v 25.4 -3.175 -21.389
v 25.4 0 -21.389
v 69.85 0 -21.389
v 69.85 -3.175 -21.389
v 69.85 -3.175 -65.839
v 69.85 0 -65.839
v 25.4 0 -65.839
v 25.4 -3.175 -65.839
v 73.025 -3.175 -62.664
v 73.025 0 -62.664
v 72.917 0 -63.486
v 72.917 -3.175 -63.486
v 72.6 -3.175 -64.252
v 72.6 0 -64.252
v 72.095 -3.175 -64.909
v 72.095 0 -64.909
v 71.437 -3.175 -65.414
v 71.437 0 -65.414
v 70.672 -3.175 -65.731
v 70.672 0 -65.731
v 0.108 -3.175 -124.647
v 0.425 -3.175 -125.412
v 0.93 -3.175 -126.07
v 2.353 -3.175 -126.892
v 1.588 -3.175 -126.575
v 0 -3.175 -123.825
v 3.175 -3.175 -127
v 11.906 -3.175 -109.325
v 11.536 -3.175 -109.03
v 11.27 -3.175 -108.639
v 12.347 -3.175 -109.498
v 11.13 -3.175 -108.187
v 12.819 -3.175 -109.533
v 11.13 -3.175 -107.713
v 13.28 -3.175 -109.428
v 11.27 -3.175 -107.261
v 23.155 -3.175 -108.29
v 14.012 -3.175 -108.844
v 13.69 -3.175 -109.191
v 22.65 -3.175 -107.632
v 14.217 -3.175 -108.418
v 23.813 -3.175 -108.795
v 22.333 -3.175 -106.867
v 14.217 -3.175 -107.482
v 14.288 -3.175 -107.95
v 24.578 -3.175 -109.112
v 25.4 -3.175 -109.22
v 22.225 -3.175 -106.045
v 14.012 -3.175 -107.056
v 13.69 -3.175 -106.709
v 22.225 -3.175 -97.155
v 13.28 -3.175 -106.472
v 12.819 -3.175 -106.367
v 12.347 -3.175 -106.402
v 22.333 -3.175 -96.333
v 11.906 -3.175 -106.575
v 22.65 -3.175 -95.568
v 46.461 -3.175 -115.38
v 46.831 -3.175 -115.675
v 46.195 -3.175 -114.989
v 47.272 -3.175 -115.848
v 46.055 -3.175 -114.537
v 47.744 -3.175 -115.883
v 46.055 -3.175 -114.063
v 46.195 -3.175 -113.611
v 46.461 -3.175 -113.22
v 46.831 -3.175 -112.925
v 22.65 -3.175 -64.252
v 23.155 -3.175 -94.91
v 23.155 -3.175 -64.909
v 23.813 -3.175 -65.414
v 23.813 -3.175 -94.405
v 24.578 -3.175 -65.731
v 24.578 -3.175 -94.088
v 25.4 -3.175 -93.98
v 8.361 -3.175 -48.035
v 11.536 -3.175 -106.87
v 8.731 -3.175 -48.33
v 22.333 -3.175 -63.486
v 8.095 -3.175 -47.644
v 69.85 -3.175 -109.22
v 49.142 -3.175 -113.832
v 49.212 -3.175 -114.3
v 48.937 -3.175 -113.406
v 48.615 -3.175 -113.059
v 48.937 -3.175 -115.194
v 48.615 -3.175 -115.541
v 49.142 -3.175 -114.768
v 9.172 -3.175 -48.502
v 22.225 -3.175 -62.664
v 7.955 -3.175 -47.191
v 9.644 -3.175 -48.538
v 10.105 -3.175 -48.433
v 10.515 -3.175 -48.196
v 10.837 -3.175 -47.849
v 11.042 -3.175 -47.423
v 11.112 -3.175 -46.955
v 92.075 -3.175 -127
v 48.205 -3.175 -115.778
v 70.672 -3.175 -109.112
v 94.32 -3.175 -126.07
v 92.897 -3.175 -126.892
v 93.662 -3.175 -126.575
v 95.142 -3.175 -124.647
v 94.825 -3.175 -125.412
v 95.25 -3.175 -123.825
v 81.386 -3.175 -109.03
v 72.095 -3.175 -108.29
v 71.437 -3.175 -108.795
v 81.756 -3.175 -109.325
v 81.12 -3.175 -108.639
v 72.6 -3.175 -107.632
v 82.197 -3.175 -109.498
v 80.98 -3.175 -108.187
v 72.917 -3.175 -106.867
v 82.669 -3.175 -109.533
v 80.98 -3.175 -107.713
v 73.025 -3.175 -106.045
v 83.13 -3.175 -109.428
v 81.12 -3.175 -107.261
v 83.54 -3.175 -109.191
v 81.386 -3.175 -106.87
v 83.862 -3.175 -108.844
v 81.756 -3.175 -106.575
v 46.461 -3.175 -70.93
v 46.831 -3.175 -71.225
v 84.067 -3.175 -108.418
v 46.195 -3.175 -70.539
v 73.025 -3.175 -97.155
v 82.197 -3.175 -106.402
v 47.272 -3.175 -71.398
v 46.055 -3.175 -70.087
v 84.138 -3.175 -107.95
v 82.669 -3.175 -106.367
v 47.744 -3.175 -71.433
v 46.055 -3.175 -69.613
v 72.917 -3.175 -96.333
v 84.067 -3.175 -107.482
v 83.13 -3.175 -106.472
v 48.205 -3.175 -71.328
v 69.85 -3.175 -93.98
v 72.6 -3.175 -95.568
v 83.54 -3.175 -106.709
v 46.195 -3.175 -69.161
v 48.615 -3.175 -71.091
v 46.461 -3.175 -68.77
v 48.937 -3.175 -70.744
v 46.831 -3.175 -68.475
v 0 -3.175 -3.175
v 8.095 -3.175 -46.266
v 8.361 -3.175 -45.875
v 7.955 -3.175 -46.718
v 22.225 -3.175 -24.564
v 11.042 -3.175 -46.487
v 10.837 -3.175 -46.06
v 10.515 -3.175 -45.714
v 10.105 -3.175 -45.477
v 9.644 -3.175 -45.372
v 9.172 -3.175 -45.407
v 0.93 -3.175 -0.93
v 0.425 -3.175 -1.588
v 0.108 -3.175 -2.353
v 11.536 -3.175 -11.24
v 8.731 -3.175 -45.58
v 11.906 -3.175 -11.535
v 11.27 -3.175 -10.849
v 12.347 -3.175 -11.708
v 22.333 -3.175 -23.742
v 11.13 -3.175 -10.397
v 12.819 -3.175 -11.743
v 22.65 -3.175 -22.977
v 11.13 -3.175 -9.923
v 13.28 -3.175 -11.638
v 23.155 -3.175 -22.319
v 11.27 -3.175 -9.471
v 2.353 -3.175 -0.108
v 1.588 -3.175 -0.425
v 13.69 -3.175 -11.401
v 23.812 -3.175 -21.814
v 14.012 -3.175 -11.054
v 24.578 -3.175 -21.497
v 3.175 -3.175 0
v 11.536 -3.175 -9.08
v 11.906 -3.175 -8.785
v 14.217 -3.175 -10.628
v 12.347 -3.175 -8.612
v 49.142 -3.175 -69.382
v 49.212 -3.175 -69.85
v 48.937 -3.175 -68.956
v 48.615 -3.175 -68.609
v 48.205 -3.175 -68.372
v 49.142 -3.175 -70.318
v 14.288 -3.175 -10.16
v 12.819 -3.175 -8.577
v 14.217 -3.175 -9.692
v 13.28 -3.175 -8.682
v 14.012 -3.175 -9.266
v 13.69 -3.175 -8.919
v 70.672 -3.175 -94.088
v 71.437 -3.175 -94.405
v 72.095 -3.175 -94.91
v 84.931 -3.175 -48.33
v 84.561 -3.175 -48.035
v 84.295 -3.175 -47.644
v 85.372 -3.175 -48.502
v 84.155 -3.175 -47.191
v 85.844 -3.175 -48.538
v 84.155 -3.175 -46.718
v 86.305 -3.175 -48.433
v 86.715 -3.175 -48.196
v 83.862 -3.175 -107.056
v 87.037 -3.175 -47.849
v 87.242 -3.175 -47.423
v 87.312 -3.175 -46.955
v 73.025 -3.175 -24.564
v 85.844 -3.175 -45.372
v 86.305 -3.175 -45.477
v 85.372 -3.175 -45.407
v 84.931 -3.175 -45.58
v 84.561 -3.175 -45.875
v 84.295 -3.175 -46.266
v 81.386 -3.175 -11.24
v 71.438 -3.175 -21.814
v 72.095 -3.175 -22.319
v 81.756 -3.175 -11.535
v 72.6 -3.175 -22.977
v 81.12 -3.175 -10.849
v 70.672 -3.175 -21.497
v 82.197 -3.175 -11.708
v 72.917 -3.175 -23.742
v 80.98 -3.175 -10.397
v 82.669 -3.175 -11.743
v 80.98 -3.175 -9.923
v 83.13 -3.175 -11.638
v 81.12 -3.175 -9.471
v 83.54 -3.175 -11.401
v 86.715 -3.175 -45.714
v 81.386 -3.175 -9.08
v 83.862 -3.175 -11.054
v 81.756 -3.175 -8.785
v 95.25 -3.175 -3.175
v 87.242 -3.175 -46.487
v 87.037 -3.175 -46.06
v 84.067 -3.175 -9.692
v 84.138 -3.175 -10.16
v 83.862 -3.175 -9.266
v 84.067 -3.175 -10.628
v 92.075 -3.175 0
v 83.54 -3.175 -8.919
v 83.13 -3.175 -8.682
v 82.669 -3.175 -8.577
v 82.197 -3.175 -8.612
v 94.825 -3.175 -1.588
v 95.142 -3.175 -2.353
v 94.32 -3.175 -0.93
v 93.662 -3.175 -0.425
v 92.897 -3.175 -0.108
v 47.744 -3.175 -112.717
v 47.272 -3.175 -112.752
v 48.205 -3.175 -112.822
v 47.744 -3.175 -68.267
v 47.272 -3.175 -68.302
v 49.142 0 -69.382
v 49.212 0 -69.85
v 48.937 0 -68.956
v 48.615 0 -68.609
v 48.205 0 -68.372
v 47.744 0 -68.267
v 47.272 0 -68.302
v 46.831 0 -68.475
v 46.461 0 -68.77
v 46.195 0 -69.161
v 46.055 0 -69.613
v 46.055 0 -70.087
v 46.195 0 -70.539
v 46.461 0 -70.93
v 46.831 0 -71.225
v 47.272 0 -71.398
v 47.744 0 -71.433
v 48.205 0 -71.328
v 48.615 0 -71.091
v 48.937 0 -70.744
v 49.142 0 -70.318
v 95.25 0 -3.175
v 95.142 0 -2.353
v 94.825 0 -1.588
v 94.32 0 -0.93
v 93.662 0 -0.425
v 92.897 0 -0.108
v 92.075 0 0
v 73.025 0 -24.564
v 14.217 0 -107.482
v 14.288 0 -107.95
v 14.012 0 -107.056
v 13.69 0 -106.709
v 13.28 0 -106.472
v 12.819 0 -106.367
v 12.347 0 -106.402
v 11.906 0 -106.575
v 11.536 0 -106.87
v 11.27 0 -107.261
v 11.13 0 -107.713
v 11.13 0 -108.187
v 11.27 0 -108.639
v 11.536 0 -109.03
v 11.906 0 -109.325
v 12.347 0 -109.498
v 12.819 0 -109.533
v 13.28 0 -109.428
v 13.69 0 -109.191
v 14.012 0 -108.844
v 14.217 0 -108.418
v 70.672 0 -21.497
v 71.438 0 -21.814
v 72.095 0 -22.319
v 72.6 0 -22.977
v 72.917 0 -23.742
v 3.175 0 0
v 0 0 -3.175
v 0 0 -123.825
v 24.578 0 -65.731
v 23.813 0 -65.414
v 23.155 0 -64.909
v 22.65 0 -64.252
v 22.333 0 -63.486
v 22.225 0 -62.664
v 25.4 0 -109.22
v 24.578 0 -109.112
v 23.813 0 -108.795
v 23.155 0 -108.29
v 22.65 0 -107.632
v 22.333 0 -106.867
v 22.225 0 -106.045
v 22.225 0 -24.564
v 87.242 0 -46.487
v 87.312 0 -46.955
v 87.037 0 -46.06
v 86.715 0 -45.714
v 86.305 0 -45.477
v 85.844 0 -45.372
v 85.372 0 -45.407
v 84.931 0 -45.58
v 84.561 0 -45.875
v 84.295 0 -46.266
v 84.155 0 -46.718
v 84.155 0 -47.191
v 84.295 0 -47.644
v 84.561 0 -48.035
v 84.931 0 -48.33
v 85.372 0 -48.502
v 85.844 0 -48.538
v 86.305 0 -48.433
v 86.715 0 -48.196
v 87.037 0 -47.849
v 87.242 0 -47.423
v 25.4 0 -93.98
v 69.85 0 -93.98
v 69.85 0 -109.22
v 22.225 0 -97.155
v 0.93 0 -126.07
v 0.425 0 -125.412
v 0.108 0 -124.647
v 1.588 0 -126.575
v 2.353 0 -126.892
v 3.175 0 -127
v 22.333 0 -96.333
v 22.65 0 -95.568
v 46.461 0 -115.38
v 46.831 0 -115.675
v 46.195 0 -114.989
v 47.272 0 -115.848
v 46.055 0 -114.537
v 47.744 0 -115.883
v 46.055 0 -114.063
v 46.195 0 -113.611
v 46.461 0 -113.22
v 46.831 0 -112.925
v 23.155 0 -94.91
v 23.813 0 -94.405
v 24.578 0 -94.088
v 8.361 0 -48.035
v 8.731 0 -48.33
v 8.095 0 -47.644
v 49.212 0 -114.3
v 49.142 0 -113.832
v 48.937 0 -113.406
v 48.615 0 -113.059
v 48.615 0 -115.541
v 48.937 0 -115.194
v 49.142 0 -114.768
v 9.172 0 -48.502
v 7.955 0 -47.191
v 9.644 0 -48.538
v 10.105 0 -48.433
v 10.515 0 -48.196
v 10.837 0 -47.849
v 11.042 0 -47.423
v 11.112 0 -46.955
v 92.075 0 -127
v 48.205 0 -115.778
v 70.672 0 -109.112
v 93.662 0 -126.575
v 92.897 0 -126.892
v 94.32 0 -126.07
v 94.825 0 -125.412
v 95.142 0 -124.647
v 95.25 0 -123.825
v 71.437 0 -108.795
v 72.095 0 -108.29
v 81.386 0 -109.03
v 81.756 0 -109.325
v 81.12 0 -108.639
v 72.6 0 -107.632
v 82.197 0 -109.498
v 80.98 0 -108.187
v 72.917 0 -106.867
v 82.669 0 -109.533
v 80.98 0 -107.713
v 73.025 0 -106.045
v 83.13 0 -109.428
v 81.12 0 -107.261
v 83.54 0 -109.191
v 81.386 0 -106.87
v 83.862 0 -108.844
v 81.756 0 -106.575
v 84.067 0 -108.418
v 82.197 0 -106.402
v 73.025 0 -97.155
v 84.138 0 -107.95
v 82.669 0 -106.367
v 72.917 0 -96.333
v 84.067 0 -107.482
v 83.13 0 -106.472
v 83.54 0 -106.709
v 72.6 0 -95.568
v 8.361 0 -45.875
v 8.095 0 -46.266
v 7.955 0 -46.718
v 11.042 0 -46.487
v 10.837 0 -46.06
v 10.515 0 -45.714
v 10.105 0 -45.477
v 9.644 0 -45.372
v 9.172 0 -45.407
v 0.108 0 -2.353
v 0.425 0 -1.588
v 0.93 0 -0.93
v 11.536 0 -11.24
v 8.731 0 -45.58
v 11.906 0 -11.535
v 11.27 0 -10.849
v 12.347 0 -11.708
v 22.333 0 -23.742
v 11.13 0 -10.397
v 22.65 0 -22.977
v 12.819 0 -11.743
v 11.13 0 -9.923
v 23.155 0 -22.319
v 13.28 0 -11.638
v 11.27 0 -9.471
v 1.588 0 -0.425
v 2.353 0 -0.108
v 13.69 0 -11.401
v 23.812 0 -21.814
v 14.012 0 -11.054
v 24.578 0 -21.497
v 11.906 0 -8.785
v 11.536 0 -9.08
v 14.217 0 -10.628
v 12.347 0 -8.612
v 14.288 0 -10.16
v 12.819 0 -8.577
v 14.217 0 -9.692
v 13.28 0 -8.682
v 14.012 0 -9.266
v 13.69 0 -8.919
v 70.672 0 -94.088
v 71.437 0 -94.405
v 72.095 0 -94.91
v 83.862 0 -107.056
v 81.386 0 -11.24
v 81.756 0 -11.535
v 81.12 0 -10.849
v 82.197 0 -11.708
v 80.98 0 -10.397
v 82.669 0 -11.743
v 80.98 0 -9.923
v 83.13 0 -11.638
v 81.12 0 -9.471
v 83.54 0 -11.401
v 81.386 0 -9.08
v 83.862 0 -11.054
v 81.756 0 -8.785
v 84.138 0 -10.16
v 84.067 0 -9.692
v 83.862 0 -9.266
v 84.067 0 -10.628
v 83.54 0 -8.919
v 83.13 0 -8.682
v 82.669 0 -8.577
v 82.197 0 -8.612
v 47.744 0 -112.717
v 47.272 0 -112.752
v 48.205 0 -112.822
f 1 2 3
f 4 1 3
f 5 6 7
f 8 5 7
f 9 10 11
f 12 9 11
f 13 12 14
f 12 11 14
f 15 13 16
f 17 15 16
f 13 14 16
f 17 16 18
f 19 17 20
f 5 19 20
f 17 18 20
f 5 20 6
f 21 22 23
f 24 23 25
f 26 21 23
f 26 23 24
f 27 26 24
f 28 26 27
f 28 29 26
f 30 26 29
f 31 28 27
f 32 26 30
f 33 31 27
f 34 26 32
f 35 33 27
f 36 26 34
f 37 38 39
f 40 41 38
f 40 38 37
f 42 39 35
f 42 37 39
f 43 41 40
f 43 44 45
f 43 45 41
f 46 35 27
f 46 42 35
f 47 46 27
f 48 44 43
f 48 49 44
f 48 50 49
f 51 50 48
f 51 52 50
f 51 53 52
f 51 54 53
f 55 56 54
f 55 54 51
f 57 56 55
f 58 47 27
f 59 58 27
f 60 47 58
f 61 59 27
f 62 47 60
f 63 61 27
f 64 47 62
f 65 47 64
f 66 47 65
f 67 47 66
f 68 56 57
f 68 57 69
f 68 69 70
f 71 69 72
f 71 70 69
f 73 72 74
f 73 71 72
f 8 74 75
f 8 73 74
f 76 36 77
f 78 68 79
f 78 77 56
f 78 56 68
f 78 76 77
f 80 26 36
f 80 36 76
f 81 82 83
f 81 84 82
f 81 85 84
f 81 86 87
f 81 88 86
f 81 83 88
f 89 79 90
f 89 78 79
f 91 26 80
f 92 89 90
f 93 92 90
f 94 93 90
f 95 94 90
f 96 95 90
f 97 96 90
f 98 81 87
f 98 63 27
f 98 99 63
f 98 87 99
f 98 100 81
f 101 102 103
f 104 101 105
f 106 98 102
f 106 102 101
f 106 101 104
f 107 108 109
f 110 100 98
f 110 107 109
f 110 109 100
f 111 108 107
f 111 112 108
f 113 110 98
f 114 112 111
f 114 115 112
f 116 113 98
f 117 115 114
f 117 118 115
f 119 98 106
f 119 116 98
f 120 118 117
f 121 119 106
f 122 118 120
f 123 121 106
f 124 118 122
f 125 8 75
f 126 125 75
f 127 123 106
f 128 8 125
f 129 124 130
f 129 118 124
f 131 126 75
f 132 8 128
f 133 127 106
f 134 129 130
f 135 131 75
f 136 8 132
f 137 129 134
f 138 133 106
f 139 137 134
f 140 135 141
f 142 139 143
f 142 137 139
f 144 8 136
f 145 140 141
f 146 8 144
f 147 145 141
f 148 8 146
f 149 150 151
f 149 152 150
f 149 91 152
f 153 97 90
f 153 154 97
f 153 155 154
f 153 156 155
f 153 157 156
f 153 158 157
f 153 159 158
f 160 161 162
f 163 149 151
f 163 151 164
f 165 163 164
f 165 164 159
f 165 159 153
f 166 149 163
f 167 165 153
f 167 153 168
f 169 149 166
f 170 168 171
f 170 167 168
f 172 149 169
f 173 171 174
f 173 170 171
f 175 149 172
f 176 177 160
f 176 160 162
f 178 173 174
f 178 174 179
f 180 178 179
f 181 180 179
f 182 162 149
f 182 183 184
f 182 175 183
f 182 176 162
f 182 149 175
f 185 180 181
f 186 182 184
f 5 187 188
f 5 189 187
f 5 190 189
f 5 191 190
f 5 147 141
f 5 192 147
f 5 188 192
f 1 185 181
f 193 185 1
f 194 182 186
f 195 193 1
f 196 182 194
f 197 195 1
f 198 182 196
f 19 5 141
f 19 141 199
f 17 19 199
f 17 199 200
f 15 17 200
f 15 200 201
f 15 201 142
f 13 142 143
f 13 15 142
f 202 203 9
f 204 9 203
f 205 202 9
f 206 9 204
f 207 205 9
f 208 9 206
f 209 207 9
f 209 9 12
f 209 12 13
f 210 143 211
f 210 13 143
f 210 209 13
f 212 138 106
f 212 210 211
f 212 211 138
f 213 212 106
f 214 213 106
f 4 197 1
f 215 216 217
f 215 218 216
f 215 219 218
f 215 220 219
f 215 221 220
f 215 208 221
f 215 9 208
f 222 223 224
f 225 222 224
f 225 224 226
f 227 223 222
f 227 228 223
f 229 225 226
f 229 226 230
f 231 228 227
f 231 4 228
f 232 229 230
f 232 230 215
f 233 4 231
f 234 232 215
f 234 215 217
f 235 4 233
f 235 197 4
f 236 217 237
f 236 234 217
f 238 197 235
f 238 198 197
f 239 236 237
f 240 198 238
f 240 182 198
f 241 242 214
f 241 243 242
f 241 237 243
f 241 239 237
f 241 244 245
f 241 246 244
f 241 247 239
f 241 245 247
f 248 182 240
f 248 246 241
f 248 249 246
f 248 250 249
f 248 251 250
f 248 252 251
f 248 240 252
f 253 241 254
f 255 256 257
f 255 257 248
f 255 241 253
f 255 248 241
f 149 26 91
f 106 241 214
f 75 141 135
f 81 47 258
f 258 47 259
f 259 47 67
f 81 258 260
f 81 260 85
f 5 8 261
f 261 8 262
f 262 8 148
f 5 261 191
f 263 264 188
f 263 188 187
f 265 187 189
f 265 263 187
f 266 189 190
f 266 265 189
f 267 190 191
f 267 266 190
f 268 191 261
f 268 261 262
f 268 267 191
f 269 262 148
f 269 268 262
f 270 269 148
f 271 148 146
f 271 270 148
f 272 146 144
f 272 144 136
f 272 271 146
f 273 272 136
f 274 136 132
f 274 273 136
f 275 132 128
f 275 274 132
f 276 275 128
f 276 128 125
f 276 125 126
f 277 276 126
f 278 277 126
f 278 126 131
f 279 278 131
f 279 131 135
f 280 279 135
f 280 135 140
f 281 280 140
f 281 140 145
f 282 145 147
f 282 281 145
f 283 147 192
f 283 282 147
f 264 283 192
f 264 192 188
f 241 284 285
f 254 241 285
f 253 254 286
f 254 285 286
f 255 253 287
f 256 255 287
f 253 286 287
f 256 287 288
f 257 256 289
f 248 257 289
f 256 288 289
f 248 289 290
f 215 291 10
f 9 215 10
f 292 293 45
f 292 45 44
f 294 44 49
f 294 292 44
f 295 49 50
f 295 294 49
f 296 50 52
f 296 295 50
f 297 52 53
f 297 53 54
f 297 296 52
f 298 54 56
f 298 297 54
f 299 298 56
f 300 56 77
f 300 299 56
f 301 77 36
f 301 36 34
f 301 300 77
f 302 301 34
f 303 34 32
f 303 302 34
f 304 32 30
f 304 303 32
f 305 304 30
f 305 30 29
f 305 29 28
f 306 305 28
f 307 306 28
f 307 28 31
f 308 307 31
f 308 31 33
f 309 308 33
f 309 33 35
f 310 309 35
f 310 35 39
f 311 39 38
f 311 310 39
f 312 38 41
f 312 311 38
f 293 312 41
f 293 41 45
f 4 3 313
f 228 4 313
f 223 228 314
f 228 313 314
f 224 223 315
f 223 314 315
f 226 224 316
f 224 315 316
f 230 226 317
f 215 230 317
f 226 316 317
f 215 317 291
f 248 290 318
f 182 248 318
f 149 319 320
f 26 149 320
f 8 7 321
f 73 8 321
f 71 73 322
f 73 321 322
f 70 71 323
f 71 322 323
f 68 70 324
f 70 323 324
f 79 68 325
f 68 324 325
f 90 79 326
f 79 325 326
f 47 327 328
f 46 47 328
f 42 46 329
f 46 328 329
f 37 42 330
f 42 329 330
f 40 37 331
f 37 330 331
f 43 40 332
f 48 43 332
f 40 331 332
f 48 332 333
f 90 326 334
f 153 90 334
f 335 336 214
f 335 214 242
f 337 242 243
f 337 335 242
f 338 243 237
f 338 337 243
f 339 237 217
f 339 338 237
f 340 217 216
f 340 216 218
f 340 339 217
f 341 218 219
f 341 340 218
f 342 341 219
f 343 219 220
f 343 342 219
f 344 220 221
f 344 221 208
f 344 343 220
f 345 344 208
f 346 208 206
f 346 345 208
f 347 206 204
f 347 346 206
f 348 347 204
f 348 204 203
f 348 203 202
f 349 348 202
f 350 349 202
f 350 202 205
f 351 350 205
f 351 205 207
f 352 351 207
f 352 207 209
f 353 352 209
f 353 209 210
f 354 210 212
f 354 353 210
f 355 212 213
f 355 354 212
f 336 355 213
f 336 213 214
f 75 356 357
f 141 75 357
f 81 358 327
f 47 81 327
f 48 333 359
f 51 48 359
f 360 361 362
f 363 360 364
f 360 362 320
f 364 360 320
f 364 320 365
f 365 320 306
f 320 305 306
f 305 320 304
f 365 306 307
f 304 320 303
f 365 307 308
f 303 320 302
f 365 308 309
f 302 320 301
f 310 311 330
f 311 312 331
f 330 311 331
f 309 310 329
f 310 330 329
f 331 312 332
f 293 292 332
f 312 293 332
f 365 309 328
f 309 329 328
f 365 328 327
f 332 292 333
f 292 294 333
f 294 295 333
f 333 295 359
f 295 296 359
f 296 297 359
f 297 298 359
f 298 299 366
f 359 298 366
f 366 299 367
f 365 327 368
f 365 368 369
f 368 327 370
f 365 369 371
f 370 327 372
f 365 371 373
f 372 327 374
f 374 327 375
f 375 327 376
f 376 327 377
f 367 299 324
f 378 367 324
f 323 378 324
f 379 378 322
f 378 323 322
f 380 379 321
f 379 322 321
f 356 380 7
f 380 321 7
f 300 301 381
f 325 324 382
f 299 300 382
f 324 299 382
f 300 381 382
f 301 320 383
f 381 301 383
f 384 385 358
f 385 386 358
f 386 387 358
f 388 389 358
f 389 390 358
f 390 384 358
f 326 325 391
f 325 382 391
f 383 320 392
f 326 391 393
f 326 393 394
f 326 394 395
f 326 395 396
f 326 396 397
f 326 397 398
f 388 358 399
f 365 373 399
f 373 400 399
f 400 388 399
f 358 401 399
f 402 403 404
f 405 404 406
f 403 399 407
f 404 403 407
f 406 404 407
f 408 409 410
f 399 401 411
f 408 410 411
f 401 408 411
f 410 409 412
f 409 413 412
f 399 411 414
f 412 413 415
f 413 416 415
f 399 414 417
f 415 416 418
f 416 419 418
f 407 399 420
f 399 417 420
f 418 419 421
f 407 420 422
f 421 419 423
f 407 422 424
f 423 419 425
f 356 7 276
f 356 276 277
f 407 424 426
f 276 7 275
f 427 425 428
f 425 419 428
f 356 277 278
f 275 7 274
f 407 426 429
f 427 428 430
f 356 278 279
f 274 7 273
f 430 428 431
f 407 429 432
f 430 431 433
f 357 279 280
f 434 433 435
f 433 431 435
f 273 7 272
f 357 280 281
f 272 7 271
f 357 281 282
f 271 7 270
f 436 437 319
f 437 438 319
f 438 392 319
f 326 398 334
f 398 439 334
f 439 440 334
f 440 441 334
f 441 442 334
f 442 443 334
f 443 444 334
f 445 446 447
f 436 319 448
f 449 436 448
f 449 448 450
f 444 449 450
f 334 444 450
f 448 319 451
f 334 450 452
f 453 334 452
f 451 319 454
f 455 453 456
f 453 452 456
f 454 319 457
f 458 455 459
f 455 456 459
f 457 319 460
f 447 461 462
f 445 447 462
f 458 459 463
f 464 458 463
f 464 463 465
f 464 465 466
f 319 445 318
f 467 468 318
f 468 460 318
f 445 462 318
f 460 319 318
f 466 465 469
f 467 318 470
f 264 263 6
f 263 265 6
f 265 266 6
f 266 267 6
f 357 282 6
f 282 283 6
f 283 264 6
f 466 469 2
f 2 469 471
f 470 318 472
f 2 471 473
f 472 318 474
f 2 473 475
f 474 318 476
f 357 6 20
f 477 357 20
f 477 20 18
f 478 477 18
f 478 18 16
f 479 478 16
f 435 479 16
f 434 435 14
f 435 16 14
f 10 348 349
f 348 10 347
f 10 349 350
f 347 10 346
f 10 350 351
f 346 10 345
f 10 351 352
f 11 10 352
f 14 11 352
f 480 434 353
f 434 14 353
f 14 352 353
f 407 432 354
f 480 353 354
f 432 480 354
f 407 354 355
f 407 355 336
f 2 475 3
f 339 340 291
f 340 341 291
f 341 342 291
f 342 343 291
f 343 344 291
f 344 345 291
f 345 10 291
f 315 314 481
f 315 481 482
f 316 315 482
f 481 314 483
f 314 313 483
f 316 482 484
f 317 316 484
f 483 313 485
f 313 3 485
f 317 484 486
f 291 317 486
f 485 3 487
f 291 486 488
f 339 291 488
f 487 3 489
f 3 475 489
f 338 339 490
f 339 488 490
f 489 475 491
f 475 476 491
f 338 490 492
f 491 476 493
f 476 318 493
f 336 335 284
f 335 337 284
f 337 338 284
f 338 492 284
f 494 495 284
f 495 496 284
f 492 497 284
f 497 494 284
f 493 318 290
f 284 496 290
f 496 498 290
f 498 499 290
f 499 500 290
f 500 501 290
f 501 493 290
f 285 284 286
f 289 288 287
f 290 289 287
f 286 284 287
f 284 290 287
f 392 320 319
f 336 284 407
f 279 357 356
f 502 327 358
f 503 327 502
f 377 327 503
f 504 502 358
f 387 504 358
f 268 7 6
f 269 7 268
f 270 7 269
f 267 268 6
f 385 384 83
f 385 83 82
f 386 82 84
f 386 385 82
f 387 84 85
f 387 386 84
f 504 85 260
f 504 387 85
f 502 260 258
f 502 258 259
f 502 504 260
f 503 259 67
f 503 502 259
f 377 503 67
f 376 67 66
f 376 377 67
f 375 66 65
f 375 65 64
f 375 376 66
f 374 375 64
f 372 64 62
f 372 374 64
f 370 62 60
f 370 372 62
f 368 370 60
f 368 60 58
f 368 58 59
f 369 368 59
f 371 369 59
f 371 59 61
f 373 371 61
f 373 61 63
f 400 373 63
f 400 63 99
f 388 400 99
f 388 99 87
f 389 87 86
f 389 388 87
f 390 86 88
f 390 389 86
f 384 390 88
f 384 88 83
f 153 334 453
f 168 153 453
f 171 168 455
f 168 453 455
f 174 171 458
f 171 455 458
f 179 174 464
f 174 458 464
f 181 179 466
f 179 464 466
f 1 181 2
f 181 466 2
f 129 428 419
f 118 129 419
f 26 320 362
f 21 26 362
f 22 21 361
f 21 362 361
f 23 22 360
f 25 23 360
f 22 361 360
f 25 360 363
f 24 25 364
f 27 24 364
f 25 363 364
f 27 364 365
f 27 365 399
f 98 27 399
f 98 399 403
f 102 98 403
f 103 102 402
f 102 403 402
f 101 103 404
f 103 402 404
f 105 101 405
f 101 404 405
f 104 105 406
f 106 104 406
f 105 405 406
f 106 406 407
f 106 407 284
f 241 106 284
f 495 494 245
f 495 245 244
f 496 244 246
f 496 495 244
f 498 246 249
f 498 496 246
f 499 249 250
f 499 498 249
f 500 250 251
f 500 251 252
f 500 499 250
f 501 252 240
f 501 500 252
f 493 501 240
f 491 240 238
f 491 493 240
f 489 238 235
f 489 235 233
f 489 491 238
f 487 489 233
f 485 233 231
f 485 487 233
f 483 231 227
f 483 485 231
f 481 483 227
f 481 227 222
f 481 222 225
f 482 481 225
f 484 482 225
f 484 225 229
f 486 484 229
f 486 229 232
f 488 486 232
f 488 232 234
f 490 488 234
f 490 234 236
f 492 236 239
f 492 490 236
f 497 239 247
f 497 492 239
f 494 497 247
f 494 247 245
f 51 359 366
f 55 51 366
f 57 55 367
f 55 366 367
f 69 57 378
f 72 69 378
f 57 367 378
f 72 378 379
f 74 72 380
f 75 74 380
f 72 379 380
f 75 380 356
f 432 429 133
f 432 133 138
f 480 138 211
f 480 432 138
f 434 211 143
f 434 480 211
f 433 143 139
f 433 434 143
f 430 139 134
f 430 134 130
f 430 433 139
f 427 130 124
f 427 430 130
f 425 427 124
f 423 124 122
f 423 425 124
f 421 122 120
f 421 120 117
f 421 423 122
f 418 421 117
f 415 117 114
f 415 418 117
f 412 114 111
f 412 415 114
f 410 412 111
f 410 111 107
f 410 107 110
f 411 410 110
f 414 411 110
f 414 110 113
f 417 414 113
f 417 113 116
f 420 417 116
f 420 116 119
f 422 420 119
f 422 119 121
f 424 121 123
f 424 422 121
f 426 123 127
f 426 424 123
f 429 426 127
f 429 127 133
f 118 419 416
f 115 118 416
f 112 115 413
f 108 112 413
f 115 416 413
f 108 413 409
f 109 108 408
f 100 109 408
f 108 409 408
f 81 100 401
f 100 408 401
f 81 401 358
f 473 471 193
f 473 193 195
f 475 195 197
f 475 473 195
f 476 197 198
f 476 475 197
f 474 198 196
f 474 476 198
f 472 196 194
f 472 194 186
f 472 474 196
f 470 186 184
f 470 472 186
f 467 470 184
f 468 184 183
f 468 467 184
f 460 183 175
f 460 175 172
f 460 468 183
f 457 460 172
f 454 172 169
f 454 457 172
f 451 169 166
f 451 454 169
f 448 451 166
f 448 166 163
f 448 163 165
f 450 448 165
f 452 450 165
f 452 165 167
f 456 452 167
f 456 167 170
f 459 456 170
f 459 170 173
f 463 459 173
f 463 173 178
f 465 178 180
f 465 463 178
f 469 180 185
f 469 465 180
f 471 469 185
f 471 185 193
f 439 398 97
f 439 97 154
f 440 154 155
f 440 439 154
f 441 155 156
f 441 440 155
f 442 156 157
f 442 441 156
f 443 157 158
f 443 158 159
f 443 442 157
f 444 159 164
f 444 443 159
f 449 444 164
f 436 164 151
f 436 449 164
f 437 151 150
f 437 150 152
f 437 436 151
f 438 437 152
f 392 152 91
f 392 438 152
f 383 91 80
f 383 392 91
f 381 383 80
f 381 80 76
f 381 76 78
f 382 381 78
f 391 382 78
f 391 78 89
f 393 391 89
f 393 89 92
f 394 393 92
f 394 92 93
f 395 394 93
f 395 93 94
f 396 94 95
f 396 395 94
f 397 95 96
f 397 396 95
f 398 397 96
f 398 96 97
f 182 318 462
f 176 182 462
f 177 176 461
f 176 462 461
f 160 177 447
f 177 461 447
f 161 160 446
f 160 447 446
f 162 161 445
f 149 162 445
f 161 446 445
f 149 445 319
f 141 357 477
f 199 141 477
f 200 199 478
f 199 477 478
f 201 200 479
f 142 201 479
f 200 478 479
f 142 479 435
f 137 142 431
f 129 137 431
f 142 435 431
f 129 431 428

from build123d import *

# Parameters (mm, degrees)
F0_R     = 1.5875
F1_DEPTH = 3.175


with BuildPart() as f1:
    # F0 (on Front) → F1 (new body)
    with BuildSketch(Plane.XZ):
        with BuildLine():
            Line((92.075, 0), (3.175, 0))
            ThreePointArc((3.175, 0), (0.929936, -0.929936), (0, -3.175))
            Line((0, -3.175), (0, -123.825))
            ThreePointArc((0, -123.825), (0.929936, -126.070064), (3.175, -127))
            Line((3.175, -127), (92.075, -127))
            ThreePointArc((92.075, -127), (94.320064, -126.070064), (95.25, -123.825))
            Line((95.25, -123.825), (95.25, -3.175))
            ThreePointArc((95.25, -3.175), (94.320064, -0.929936), (92.075, 0))
        make_face()
        with Locations((12.7, -107.95)):
            Circle(F0_R, mode=Mode.SUBTRACT)
        with Locations((47.625, -114.3)):
            Circle(F0_R, mode=Mode.SUBTRACT)
        with BuildLine():
            Line((25.4, -93.98), (69.85, -93.98))
            ThreePointArc((69.85, -93.98), (72.095064, -94.909936), (73.025, -97.155))
            Line((73.025, -97.155), (73.025, -106.045))
            ThreePointArc((73.025, -106.045), (72.095064, -108.290064), (69.85, -109.22))
            Line((69.85, -109.22), (25.4, -109.22))
            ThreePointArc((25.4, -109.22), (23.154936, -108.290064), (22.225, -106.045))
            Line((22.225, -106.045), (22.225, -97.155))
            ThreePointArc((22.225, -97.155), (23.154936, -94.909936), (25.4, -93.98))
        make_face(mode=Mode.SUBTRACT)
        with Locations((82.55, -107.95)):
            Circle(F0_R, mode=Mode.SUBTRACT)
        with Locations((47.625, -69.85)):
            Circle(F0_R, mode=Mode.SUBTRACT)
        with Locations((9.525, -46.954749)):
            Circle(F0_R, mode=Mode.SUBTRACT)
        with Locations((12.7, -10.16)):
            Circle(F0_R, mode=Mode.SUBTRACT)
        with BuildLine():
            ThreePointArc((22.225, -24.564049), (23.154936, -22.318984), (25.4, -21.389049))
            Line((25.4, -21.389049), (69.85, -21.389049))
            ThreePointArc((69.85, -21.389049), (72.095064, -22.318984), (73.025, -24.564049))
            Line((73.025, -24.564049), (73.025, -62.664049))
            ThreePointArc((73.025, -62.664049), (72.095064, -64.909113), (69.85, -65.839049))
            Line((69.85, -65.839049), (25.4, -65.839049))
            ThreePointArc((25.4, -65.839049), (23.154936, -64.909113), (22.225, -62.664049))
            Line((22.225, -62.664049), (22.225, -24.564049))
        make_face(mode=Mode.SUBTRACT)
        with Locations((85.725, -46.954749)):
            Circle(F0_R, mode=Mode.SUBTRACT)
        with Locations((82.55, -10.16)):
            Circle(F0_R, mode=Mode.SUBTRACT)
    extrude(amount=F1_DEPTH)


solid = f1.part
